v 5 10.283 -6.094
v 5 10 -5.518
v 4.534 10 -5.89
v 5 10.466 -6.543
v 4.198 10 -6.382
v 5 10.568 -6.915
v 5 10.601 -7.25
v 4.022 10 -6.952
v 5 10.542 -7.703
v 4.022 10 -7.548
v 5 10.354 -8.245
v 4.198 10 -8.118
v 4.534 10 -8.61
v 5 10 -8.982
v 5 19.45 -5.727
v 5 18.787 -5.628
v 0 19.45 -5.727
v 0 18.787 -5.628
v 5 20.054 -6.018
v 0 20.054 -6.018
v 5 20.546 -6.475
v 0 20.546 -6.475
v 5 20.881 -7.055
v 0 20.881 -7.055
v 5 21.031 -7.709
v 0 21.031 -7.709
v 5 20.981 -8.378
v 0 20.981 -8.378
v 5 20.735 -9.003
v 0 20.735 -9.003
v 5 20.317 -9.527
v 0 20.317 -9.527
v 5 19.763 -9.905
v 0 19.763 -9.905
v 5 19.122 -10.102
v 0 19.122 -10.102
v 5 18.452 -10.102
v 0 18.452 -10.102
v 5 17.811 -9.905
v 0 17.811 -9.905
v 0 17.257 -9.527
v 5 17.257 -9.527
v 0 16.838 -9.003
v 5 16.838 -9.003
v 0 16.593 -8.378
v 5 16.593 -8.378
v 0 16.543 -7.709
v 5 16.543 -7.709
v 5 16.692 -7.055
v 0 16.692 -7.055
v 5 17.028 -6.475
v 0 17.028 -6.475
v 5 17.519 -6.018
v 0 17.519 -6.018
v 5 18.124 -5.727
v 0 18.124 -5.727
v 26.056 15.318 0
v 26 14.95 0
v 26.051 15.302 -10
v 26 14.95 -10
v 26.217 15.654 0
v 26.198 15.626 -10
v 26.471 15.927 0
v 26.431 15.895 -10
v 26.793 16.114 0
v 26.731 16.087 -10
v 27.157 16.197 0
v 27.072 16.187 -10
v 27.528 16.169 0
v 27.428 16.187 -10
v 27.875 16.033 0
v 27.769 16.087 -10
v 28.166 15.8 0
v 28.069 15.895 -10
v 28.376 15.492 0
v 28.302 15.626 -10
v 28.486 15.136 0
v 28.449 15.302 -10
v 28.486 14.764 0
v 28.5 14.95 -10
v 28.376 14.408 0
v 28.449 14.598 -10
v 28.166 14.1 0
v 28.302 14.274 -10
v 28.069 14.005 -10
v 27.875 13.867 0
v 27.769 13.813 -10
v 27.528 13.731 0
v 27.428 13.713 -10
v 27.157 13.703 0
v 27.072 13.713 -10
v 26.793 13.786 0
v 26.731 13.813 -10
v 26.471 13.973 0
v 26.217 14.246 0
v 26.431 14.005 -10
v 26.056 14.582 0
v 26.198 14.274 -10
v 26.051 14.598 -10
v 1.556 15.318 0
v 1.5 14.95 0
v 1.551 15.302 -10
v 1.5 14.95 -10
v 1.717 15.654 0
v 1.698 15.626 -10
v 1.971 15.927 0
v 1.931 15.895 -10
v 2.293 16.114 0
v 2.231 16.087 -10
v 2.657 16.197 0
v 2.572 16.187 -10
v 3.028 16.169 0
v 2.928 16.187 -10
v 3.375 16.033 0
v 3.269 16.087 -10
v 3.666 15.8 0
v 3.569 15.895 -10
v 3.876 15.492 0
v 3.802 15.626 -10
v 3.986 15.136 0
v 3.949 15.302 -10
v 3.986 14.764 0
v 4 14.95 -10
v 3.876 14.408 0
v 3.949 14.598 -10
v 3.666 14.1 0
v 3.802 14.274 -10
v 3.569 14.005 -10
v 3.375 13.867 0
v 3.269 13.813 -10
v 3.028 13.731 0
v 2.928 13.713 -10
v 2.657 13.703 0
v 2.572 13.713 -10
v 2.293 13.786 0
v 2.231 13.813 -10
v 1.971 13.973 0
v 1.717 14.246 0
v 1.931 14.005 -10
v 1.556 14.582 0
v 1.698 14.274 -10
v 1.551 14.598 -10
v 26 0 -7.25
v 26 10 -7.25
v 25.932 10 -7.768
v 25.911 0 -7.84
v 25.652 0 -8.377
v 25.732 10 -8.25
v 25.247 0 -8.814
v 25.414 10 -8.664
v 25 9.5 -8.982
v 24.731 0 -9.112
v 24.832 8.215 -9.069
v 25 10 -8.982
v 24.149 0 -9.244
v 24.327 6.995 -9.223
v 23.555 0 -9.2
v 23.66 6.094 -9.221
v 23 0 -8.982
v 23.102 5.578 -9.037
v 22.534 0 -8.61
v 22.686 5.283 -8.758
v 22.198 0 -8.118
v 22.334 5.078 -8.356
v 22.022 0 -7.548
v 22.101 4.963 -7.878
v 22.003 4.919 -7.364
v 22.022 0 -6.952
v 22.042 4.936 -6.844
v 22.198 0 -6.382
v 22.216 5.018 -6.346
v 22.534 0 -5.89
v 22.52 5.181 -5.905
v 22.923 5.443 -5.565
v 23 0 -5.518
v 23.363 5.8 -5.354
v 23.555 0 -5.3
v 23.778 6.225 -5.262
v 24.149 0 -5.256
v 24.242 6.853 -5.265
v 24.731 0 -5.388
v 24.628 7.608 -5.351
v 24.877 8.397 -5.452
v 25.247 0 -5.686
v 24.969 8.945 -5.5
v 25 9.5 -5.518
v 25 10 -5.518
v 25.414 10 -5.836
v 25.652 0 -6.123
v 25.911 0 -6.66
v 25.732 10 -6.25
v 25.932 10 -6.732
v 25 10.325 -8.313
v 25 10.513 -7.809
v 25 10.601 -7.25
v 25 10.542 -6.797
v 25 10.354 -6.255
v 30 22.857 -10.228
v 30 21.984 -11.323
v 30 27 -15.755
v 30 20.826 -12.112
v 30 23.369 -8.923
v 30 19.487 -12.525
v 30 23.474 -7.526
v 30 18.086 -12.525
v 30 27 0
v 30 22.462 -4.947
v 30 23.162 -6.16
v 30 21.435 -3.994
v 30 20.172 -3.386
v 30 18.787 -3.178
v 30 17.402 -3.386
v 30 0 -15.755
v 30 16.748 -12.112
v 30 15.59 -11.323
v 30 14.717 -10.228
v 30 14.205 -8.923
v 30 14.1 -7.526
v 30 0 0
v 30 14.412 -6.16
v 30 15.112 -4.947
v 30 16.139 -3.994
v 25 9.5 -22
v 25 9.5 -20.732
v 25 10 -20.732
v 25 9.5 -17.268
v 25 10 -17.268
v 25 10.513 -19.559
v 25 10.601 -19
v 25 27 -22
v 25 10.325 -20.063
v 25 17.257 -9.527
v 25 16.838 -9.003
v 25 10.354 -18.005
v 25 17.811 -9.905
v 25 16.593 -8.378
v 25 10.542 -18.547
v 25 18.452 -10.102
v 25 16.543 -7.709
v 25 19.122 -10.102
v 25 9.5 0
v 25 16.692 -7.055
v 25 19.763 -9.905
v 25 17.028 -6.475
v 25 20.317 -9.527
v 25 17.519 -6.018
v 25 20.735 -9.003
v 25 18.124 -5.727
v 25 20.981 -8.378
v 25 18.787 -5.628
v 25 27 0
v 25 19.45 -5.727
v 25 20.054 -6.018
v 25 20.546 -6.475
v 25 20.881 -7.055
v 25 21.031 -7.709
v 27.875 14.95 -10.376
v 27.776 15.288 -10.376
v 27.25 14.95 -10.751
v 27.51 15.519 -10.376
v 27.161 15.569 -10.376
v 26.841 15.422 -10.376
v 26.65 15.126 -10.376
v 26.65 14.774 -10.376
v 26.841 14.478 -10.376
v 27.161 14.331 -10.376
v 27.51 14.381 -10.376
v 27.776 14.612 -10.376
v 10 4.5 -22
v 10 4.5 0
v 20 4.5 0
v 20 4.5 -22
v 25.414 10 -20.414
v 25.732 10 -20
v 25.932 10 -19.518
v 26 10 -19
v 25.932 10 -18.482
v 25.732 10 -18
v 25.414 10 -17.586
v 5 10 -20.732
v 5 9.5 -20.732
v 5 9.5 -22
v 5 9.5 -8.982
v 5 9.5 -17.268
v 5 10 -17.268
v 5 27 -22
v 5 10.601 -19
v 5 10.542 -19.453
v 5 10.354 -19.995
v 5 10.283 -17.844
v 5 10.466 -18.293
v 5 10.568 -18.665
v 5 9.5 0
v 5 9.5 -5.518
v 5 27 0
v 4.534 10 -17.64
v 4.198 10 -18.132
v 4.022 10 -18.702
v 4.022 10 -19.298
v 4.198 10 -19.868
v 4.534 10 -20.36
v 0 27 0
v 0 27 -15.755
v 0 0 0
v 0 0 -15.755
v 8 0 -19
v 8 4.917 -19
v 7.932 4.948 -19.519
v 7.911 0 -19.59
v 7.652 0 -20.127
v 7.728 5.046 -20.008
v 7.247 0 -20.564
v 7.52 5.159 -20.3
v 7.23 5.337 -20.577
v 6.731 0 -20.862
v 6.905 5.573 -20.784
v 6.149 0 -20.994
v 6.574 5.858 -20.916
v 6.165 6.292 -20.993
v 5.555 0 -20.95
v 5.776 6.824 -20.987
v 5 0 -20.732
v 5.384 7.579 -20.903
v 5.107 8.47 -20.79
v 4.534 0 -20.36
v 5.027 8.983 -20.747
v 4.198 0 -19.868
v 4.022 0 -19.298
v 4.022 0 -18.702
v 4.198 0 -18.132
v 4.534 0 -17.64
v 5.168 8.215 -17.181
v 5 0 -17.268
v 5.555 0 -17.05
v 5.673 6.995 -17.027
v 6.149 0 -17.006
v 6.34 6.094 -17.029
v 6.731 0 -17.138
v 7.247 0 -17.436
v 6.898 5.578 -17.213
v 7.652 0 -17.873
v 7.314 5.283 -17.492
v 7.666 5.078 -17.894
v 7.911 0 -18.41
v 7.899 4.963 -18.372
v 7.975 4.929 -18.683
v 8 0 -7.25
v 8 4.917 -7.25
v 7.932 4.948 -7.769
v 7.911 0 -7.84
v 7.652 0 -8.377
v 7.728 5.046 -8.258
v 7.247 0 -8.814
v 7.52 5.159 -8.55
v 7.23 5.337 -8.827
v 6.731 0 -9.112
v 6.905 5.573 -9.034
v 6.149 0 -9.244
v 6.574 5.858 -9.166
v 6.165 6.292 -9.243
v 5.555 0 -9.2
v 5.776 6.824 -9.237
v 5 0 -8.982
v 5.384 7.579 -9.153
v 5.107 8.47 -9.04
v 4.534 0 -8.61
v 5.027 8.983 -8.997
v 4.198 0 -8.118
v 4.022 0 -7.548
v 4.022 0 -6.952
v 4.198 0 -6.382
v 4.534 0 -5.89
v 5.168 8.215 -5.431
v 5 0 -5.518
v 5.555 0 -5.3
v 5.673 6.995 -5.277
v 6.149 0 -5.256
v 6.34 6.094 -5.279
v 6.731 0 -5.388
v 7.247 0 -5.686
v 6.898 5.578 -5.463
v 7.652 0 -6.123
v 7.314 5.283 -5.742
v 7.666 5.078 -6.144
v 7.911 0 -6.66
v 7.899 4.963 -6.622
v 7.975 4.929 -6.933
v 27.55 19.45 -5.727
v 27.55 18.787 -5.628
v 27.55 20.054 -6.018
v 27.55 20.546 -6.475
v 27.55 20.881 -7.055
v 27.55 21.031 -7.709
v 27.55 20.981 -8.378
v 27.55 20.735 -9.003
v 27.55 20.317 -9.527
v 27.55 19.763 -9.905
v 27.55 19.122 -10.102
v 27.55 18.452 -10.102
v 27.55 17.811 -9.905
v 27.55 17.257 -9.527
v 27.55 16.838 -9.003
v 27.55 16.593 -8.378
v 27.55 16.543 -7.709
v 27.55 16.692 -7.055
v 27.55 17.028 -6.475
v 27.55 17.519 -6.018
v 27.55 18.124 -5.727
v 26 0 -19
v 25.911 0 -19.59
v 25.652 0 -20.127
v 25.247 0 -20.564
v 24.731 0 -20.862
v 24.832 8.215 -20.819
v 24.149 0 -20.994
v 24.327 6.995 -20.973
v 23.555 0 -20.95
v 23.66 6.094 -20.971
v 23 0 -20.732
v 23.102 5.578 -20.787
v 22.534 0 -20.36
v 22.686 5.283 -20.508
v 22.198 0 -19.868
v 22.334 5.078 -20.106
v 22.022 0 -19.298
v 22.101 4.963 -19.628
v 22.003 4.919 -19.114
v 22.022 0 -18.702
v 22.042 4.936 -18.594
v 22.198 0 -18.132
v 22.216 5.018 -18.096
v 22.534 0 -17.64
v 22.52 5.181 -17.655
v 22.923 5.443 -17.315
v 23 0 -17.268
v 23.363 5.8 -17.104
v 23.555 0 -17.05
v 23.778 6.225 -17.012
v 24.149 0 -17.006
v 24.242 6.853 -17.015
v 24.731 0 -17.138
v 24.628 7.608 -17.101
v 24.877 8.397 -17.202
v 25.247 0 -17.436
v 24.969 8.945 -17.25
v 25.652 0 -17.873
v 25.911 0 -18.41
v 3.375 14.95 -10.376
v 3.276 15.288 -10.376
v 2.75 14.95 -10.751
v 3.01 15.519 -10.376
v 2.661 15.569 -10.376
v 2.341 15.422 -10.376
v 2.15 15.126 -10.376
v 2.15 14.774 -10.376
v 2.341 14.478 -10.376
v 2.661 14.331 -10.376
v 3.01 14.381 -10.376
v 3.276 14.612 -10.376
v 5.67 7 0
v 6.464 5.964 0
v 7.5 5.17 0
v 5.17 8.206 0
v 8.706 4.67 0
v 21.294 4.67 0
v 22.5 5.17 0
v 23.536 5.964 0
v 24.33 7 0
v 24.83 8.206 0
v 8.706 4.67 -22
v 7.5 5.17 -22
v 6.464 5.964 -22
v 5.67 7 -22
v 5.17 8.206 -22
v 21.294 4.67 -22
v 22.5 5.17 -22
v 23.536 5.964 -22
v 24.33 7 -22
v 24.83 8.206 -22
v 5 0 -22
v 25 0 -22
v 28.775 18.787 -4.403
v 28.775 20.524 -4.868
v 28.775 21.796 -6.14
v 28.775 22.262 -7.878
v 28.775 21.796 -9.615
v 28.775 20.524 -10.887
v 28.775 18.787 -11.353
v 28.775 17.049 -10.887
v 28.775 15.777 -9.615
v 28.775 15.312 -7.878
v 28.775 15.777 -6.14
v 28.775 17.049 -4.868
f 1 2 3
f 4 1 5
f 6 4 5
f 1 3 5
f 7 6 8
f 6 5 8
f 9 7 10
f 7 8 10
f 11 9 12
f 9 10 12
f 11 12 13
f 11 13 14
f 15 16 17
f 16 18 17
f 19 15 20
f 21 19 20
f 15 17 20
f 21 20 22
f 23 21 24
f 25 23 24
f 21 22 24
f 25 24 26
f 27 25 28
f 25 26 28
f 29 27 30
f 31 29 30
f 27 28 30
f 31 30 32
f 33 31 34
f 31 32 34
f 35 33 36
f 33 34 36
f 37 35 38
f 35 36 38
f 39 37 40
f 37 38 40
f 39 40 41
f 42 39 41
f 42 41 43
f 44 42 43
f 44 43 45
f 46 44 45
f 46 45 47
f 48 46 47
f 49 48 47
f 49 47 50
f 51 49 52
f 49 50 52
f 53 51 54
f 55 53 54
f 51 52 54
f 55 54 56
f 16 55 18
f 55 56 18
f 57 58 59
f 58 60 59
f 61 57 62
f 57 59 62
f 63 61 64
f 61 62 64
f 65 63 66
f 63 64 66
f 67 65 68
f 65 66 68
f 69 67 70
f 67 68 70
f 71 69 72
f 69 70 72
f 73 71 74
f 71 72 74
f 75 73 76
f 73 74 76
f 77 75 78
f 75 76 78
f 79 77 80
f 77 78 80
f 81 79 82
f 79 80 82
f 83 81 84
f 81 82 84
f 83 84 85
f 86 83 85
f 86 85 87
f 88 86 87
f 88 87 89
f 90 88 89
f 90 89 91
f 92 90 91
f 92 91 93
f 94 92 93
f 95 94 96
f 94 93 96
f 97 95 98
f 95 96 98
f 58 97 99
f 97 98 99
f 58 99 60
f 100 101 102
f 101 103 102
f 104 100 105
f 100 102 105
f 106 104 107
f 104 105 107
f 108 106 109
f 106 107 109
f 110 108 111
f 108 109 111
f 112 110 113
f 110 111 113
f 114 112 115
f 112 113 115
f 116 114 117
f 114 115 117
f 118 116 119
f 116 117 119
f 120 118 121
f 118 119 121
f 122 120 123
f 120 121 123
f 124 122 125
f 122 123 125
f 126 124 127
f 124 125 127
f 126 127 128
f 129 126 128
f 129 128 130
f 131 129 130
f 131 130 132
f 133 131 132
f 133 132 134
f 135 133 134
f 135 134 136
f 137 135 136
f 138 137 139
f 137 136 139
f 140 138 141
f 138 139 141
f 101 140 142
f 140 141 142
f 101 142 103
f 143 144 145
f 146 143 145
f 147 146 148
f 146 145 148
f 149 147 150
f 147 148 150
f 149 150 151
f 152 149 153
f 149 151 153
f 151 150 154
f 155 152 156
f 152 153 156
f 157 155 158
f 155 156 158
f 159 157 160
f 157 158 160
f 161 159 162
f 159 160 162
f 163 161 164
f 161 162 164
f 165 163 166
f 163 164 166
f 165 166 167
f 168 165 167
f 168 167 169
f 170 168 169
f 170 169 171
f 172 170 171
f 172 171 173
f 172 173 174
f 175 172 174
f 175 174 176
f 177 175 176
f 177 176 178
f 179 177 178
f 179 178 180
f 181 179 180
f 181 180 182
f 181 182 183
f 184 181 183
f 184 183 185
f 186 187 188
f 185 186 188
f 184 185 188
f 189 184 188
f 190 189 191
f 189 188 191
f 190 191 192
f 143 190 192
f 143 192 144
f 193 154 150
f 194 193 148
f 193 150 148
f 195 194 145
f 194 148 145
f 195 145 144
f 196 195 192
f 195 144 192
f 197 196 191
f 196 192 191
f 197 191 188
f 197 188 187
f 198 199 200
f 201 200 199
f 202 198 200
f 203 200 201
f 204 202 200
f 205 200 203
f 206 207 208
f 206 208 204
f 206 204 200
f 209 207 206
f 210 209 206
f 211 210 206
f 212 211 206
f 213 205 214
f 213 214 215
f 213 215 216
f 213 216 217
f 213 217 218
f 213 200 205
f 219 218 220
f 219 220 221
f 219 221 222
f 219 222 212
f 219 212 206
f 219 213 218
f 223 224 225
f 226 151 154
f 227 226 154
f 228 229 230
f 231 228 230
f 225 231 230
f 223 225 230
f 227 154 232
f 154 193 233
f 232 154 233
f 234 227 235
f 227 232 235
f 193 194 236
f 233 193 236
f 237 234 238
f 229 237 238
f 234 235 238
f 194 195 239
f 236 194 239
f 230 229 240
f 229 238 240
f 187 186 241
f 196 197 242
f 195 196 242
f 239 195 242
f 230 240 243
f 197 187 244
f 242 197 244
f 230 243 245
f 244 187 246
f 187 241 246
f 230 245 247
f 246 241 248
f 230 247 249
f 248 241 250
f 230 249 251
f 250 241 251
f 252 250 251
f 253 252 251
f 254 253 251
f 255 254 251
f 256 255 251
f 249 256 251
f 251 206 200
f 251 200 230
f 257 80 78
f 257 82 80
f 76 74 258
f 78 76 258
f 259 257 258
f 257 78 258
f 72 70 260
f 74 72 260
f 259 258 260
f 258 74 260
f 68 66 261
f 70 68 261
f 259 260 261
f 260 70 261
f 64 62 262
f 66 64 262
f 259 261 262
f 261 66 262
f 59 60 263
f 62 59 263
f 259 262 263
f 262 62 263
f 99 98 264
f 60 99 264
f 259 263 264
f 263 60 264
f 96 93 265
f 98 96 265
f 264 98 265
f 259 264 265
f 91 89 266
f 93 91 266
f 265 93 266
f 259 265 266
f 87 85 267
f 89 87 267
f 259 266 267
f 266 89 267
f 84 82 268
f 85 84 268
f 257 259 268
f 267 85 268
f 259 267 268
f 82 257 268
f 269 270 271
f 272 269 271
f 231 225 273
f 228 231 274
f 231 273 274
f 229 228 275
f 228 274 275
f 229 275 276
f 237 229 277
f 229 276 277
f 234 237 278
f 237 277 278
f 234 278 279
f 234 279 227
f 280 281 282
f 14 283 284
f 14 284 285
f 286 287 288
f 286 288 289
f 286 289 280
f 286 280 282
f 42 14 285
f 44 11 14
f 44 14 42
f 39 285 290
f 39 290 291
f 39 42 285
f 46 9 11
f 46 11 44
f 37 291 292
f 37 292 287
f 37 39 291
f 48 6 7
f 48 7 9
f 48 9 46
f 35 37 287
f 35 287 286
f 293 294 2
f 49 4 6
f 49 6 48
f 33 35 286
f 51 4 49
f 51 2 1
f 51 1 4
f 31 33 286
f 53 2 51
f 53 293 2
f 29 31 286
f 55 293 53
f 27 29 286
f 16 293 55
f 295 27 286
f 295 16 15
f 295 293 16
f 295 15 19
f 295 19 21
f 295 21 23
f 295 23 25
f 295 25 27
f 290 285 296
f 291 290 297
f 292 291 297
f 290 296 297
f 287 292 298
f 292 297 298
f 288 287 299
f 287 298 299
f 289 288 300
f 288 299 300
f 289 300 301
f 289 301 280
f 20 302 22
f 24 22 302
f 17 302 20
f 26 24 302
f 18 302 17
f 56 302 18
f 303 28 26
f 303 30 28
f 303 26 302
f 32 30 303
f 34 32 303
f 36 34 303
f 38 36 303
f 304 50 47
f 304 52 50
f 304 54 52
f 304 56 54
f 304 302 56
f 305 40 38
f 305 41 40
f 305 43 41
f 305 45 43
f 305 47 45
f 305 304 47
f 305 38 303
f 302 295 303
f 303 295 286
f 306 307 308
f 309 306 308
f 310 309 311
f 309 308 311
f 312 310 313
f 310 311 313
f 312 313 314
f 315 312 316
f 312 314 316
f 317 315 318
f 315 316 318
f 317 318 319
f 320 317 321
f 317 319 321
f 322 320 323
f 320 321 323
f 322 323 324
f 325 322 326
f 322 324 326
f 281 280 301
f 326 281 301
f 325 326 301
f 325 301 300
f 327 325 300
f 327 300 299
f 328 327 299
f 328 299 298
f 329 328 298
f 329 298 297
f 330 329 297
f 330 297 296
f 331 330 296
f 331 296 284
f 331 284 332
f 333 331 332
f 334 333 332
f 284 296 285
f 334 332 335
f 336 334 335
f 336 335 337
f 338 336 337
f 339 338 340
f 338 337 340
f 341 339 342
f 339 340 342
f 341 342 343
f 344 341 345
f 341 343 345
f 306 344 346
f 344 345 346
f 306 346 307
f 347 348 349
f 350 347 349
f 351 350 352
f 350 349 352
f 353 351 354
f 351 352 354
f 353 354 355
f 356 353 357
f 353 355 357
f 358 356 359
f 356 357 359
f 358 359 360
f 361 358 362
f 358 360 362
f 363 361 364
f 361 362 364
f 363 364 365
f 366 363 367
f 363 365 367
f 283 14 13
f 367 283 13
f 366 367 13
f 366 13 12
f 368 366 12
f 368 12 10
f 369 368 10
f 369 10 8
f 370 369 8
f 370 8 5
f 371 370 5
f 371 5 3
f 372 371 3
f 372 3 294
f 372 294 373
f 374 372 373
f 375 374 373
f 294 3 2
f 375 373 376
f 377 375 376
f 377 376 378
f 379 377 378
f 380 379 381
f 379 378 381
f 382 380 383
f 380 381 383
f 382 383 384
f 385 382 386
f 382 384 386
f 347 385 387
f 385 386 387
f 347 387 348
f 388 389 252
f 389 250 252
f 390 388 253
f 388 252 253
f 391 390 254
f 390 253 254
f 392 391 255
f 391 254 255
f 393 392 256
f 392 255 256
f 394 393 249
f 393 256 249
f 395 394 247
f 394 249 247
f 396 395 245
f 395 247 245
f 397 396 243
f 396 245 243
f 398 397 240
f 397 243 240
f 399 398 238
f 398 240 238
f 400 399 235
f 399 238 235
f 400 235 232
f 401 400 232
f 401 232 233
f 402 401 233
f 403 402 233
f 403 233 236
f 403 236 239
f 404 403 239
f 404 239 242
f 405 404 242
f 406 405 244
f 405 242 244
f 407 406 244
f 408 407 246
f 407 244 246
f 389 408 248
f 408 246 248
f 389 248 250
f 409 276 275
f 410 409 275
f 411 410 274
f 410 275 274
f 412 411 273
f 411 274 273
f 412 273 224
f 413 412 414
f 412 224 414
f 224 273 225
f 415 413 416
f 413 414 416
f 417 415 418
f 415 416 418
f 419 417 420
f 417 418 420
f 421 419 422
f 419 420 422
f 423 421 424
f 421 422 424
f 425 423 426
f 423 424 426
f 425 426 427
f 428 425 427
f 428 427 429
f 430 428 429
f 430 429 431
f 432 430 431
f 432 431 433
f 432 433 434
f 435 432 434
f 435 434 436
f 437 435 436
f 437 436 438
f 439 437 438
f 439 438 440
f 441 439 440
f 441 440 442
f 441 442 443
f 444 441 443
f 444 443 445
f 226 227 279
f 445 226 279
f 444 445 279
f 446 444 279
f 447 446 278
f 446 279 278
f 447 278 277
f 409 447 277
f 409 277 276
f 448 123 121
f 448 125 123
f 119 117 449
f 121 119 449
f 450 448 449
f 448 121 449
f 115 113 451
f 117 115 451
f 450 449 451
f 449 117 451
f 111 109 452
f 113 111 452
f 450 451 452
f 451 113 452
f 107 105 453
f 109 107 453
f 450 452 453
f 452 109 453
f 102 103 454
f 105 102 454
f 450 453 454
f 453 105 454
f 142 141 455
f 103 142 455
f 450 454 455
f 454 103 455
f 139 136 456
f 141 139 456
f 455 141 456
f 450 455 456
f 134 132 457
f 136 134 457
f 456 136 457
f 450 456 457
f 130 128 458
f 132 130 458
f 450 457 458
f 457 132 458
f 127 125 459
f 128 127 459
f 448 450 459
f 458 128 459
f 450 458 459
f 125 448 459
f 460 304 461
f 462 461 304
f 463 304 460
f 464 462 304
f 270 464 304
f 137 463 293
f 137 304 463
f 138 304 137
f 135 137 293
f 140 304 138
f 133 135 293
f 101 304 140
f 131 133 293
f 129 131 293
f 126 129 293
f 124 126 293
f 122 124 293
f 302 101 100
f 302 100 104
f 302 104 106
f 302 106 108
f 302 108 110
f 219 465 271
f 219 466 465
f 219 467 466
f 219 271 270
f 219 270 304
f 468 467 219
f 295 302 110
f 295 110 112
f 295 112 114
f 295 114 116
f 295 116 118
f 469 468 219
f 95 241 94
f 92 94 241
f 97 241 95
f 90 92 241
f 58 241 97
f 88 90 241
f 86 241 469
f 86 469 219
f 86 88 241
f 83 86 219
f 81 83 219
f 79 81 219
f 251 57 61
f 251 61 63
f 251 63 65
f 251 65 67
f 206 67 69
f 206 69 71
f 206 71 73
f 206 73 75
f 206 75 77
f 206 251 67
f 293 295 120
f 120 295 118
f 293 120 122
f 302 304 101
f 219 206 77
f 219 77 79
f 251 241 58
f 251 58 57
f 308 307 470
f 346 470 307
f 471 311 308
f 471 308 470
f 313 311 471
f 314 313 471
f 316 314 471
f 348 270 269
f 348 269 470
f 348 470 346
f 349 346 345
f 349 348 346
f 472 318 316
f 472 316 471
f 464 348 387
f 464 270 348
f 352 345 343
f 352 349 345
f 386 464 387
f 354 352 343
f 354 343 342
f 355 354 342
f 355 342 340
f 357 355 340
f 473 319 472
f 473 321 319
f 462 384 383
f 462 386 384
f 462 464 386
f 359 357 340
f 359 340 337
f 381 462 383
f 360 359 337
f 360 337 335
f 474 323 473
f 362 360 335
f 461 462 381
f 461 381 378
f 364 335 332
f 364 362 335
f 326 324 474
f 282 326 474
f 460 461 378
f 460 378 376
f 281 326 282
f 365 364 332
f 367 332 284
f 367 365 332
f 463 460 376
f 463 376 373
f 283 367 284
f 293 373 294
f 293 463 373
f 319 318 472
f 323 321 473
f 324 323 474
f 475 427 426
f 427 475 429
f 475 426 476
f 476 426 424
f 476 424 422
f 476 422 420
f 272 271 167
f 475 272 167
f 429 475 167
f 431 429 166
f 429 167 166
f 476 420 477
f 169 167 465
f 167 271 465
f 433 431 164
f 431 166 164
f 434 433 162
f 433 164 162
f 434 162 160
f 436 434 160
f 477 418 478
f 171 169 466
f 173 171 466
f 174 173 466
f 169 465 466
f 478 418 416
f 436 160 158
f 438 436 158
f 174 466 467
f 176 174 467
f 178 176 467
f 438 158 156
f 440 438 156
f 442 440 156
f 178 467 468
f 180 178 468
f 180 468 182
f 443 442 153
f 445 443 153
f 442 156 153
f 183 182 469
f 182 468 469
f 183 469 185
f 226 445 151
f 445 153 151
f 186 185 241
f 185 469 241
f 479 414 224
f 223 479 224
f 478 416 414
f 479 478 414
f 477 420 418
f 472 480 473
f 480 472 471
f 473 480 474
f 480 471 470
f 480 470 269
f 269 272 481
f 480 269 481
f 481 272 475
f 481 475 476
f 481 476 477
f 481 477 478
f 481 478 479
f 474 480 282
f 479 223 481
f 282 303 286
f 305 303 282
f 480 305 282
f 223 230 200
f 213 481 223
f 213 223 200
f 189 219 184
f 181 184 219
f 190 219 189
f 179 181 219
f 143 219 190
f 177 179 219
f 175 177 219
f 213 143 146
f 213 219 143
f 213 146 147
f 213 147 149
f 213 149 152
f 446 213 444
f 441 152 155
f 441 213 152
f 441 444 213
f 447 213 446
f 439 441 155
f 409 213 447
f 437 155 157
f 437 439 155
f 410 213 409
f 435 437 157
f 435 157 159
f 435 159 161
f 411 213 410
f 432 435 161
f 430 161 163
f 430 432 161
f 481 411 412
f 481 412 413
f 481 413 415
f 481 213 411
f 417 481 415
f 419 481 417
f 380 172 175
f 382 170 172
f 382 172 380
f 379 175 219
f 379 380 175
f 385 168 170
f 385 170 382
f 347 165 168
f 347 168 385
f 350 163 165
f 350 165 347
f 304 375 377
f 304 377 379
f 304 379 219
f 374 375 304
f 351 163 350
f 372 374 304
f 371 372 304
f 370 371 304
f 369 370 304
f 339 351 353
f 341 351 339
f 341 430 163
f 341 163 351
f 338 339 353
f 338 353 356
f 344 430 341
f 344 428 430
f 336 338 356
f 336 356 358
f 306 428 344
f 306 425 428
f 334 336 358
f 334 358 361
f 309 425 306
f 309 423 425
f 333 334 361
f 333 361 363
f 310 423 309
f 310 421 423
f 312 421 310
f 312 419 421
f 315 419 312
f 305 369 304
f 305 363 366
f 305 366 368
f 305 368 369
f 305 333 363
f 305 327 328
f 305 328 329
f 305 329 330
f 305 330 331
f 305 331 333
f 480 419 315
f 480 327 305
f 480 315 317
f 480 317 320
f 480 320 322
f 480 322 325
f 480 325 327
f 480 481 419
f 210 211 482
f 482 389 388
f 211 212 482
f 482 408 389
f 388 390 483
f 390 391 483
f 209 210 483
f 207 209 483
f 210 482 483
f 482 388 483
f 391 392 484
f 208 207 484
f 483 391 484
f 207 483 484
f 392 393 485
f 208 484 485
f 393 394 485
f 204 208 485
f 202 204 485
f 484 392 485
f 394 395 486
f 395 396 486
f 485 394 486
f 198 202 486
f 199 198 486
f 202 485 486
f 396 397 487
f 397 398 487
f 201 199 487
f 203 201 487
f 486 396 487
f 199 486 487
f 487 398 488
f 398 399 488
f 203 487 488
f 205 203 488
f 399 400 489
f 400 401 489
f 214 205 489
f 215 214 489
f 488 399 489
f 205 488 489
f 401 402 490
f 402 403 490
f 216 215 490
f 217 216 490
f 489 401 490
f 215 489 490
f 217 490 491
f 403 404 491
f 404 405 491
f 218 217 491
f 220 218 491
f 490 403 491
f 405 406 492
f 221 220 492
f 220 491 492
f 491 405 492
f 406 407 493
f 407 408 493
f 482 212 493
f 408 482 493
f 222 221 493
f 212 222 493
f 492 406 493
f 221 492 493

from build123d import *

# Parameters (mm, degrees)
BOSS_EXTRUDE1_DEPTH                                 = 27
SKETCH2_W                                           = 20
SKETCH2_H                                           = 22.5
CUT_EXTRUDE1_DEPTH                                  = 22
BOSS_EXTRUDE2_DEPTH                                 = 22
CSK_FOR_M4_COUNTERSUNK_FLAT_HEAD_SCREW1_D           = 4.5
CSK_FOR_M4_COUNTERSUNK_FLAT_HEAD_SCREW1_DEPTH       = 35
CSK_FOR_M4_COUNTERSUNK_FLAT_HEAD_SCREW1_CSINK_D     = 9.4
CSK_FOR_M4_COUNTERSUNK_FLAT_HEAD_SCREW1_CSINK_ANGLE = 90
CSK_FOR_M4_COUNTERSUNK_FLAT_HEAD_SCREW1_TIP         = 1.351936393
F_2_5MM_DOWEL_HOLE1_D                               = 2.5
F_2_5MM_DOWEL_HOLE1_DEPTH                           = 10
F_2_5MM_DOWEL_HOLE1_TIP                             = 0.751075774
F_4_0MM_DOWEL_HOLE1_D                               = 4
F_4_0MM_DOWEL_HOLE1_DEPTH                           = 10
F_4_0MM_DOWEL_HOLE1_TIP                             = 1.201721238


with BuildPart() as part:
    # Sketch1 → Boss-Extrude1 (new body)
    with BuildSketch(Plane(origin=(0, 0, 0), x_dir=(1, 0, 0), z_dir=(0, 1, 0))):
        Polygon((0, 0), (0, 15.755002002), (5, 22), (25, 22), (30, 15.755002002), (30, 0), align=None)
    extrude(amount=BOSS_EXTRUDE1_DEPTH)

    # Sketch2 → Cut-Extrude1 (cut)
    with BuildSketch(Plane.XY):
        with Locations((15, 15.75)):
            Rectangle(SKETCH2_W, SKETCH2_H)
    extrude(amount=-CUT_EXTRUDE1_DEPTH, mode=Mode.SUBTRACT)

    # Sketch3 → Boss-Extrude2 (add)
    with BuildSketch(Plane.XY):
        with BuildLine():
            Line((5, 9.5), (5, 4.5))
            Line((5, 4.5), (10, 4.5))
            ThreePointArc((10, 4.5), (6.464466094, 5.964466094), (5, 9.5))
        make_face()
        with BuildLine():
            Line((25, 9.5), (25, 4.5))
            Line((25, 4.5), (20, 4.5))
            ThreePointArc((20, 4.5), (23.535533906, 5.964466094), (25, 9.5))
        make_face()
    extrude(amount=-BOSS_EXTRUDE2_DEPTH)

    # CSK for M4 Countersunk Flat Head Screw1
    with Locations(Plane(origin=(30, 0, 0), x_dir=(0, 0, -1), z_dir=(1, 0, 0))):
        with Locations((7.877501001, 18.78691821)):
            CounterSinkHole(CSK_FOR_M4_COUNTERSUNK_FLAT_HEAD_SCREW1_D / 2, CSK_FOR_M4_COUNTERSUNK_FLAT_HEAD_SCREW1_CSINK_D / 2, depth=CSK_FOR_M4_COUNTERSUNK_FLAT_HEAD_SCREW1_DEPTH, counter_sink_angle=CSK_FOR_M4_COUNTERSUNK_FLAT_HEAD_SCREW1_CSINK_ANGLE)
            with Locations((0, 0, -(CSK_FOR_M4_COUNTERSUNK_FLAT_HEAD_SCREW1_DEPTH + CSK_FOR_M4_COUNTERSUNK_FLAT_HEAD_SCREW1_TIP / 2))):  # 118° drill point
                Cone(0, CSK_FOR_M4_COUNTERSUNK_FLAT_HEAD_SCREW1_D / 2, CSK_FOR_M4_COUNTERSUNK_FLAT_HEAD_SCREW1_TIP, mode=Mode.SUBTRACT)

    # Ø2.5mm Dowel Hole1
    with Locations(Plane.XY):
        with Locations((2.75, 14.95), (27.25, 14.95)):
            Hole(F_2_5MM_DOWEL_HOLE1_D / 2, depth=F_2_5MM_DOWEL_HOLE1_DEPTH)
            with Locations((0, 0, -(F_2_5MM_DOWEL_HOLE1_DEPTH + F_2_5MM_DOWEL_HOLE1_TIP / 2))):  # 118° drill point
                Cone(0, F_2_5MM_DOWEL_HOLE1_D / 2, F_2_5MM_DOWEL_HOLE1_TIP, mode=Mode.SUBTRACT)

    # Ø4.0mm Dowel Hole1
    with Locations(Plane(origin=(0, 0, 0), x_dir=(-1, 0, 0), z_dir=(0, -1, 0))):
        with Locations((-24, 19), (-6, 19), (-6, 7.25), (-24, 7.25)):
            Hole(F_4_0MM_DOWEL_HOLE1_D / 2, depth=F_4_0MM_DOWEL_HOLE1_DEPTH)
            with Locations((0, 0, -(F_4_0MM_DOWEL_HOLE1_DEPTH + F_4_0MM_DOWEL_HOLE1_TIP / 2))):  # 118° drill point
                Cone(0, F_4_0MM_DOWEL_HOLE1_D / 2, F_4_0MM_DOWEL_HOLE1_TIP, mode=Mode.SUBTRACT)


solid = part.part
